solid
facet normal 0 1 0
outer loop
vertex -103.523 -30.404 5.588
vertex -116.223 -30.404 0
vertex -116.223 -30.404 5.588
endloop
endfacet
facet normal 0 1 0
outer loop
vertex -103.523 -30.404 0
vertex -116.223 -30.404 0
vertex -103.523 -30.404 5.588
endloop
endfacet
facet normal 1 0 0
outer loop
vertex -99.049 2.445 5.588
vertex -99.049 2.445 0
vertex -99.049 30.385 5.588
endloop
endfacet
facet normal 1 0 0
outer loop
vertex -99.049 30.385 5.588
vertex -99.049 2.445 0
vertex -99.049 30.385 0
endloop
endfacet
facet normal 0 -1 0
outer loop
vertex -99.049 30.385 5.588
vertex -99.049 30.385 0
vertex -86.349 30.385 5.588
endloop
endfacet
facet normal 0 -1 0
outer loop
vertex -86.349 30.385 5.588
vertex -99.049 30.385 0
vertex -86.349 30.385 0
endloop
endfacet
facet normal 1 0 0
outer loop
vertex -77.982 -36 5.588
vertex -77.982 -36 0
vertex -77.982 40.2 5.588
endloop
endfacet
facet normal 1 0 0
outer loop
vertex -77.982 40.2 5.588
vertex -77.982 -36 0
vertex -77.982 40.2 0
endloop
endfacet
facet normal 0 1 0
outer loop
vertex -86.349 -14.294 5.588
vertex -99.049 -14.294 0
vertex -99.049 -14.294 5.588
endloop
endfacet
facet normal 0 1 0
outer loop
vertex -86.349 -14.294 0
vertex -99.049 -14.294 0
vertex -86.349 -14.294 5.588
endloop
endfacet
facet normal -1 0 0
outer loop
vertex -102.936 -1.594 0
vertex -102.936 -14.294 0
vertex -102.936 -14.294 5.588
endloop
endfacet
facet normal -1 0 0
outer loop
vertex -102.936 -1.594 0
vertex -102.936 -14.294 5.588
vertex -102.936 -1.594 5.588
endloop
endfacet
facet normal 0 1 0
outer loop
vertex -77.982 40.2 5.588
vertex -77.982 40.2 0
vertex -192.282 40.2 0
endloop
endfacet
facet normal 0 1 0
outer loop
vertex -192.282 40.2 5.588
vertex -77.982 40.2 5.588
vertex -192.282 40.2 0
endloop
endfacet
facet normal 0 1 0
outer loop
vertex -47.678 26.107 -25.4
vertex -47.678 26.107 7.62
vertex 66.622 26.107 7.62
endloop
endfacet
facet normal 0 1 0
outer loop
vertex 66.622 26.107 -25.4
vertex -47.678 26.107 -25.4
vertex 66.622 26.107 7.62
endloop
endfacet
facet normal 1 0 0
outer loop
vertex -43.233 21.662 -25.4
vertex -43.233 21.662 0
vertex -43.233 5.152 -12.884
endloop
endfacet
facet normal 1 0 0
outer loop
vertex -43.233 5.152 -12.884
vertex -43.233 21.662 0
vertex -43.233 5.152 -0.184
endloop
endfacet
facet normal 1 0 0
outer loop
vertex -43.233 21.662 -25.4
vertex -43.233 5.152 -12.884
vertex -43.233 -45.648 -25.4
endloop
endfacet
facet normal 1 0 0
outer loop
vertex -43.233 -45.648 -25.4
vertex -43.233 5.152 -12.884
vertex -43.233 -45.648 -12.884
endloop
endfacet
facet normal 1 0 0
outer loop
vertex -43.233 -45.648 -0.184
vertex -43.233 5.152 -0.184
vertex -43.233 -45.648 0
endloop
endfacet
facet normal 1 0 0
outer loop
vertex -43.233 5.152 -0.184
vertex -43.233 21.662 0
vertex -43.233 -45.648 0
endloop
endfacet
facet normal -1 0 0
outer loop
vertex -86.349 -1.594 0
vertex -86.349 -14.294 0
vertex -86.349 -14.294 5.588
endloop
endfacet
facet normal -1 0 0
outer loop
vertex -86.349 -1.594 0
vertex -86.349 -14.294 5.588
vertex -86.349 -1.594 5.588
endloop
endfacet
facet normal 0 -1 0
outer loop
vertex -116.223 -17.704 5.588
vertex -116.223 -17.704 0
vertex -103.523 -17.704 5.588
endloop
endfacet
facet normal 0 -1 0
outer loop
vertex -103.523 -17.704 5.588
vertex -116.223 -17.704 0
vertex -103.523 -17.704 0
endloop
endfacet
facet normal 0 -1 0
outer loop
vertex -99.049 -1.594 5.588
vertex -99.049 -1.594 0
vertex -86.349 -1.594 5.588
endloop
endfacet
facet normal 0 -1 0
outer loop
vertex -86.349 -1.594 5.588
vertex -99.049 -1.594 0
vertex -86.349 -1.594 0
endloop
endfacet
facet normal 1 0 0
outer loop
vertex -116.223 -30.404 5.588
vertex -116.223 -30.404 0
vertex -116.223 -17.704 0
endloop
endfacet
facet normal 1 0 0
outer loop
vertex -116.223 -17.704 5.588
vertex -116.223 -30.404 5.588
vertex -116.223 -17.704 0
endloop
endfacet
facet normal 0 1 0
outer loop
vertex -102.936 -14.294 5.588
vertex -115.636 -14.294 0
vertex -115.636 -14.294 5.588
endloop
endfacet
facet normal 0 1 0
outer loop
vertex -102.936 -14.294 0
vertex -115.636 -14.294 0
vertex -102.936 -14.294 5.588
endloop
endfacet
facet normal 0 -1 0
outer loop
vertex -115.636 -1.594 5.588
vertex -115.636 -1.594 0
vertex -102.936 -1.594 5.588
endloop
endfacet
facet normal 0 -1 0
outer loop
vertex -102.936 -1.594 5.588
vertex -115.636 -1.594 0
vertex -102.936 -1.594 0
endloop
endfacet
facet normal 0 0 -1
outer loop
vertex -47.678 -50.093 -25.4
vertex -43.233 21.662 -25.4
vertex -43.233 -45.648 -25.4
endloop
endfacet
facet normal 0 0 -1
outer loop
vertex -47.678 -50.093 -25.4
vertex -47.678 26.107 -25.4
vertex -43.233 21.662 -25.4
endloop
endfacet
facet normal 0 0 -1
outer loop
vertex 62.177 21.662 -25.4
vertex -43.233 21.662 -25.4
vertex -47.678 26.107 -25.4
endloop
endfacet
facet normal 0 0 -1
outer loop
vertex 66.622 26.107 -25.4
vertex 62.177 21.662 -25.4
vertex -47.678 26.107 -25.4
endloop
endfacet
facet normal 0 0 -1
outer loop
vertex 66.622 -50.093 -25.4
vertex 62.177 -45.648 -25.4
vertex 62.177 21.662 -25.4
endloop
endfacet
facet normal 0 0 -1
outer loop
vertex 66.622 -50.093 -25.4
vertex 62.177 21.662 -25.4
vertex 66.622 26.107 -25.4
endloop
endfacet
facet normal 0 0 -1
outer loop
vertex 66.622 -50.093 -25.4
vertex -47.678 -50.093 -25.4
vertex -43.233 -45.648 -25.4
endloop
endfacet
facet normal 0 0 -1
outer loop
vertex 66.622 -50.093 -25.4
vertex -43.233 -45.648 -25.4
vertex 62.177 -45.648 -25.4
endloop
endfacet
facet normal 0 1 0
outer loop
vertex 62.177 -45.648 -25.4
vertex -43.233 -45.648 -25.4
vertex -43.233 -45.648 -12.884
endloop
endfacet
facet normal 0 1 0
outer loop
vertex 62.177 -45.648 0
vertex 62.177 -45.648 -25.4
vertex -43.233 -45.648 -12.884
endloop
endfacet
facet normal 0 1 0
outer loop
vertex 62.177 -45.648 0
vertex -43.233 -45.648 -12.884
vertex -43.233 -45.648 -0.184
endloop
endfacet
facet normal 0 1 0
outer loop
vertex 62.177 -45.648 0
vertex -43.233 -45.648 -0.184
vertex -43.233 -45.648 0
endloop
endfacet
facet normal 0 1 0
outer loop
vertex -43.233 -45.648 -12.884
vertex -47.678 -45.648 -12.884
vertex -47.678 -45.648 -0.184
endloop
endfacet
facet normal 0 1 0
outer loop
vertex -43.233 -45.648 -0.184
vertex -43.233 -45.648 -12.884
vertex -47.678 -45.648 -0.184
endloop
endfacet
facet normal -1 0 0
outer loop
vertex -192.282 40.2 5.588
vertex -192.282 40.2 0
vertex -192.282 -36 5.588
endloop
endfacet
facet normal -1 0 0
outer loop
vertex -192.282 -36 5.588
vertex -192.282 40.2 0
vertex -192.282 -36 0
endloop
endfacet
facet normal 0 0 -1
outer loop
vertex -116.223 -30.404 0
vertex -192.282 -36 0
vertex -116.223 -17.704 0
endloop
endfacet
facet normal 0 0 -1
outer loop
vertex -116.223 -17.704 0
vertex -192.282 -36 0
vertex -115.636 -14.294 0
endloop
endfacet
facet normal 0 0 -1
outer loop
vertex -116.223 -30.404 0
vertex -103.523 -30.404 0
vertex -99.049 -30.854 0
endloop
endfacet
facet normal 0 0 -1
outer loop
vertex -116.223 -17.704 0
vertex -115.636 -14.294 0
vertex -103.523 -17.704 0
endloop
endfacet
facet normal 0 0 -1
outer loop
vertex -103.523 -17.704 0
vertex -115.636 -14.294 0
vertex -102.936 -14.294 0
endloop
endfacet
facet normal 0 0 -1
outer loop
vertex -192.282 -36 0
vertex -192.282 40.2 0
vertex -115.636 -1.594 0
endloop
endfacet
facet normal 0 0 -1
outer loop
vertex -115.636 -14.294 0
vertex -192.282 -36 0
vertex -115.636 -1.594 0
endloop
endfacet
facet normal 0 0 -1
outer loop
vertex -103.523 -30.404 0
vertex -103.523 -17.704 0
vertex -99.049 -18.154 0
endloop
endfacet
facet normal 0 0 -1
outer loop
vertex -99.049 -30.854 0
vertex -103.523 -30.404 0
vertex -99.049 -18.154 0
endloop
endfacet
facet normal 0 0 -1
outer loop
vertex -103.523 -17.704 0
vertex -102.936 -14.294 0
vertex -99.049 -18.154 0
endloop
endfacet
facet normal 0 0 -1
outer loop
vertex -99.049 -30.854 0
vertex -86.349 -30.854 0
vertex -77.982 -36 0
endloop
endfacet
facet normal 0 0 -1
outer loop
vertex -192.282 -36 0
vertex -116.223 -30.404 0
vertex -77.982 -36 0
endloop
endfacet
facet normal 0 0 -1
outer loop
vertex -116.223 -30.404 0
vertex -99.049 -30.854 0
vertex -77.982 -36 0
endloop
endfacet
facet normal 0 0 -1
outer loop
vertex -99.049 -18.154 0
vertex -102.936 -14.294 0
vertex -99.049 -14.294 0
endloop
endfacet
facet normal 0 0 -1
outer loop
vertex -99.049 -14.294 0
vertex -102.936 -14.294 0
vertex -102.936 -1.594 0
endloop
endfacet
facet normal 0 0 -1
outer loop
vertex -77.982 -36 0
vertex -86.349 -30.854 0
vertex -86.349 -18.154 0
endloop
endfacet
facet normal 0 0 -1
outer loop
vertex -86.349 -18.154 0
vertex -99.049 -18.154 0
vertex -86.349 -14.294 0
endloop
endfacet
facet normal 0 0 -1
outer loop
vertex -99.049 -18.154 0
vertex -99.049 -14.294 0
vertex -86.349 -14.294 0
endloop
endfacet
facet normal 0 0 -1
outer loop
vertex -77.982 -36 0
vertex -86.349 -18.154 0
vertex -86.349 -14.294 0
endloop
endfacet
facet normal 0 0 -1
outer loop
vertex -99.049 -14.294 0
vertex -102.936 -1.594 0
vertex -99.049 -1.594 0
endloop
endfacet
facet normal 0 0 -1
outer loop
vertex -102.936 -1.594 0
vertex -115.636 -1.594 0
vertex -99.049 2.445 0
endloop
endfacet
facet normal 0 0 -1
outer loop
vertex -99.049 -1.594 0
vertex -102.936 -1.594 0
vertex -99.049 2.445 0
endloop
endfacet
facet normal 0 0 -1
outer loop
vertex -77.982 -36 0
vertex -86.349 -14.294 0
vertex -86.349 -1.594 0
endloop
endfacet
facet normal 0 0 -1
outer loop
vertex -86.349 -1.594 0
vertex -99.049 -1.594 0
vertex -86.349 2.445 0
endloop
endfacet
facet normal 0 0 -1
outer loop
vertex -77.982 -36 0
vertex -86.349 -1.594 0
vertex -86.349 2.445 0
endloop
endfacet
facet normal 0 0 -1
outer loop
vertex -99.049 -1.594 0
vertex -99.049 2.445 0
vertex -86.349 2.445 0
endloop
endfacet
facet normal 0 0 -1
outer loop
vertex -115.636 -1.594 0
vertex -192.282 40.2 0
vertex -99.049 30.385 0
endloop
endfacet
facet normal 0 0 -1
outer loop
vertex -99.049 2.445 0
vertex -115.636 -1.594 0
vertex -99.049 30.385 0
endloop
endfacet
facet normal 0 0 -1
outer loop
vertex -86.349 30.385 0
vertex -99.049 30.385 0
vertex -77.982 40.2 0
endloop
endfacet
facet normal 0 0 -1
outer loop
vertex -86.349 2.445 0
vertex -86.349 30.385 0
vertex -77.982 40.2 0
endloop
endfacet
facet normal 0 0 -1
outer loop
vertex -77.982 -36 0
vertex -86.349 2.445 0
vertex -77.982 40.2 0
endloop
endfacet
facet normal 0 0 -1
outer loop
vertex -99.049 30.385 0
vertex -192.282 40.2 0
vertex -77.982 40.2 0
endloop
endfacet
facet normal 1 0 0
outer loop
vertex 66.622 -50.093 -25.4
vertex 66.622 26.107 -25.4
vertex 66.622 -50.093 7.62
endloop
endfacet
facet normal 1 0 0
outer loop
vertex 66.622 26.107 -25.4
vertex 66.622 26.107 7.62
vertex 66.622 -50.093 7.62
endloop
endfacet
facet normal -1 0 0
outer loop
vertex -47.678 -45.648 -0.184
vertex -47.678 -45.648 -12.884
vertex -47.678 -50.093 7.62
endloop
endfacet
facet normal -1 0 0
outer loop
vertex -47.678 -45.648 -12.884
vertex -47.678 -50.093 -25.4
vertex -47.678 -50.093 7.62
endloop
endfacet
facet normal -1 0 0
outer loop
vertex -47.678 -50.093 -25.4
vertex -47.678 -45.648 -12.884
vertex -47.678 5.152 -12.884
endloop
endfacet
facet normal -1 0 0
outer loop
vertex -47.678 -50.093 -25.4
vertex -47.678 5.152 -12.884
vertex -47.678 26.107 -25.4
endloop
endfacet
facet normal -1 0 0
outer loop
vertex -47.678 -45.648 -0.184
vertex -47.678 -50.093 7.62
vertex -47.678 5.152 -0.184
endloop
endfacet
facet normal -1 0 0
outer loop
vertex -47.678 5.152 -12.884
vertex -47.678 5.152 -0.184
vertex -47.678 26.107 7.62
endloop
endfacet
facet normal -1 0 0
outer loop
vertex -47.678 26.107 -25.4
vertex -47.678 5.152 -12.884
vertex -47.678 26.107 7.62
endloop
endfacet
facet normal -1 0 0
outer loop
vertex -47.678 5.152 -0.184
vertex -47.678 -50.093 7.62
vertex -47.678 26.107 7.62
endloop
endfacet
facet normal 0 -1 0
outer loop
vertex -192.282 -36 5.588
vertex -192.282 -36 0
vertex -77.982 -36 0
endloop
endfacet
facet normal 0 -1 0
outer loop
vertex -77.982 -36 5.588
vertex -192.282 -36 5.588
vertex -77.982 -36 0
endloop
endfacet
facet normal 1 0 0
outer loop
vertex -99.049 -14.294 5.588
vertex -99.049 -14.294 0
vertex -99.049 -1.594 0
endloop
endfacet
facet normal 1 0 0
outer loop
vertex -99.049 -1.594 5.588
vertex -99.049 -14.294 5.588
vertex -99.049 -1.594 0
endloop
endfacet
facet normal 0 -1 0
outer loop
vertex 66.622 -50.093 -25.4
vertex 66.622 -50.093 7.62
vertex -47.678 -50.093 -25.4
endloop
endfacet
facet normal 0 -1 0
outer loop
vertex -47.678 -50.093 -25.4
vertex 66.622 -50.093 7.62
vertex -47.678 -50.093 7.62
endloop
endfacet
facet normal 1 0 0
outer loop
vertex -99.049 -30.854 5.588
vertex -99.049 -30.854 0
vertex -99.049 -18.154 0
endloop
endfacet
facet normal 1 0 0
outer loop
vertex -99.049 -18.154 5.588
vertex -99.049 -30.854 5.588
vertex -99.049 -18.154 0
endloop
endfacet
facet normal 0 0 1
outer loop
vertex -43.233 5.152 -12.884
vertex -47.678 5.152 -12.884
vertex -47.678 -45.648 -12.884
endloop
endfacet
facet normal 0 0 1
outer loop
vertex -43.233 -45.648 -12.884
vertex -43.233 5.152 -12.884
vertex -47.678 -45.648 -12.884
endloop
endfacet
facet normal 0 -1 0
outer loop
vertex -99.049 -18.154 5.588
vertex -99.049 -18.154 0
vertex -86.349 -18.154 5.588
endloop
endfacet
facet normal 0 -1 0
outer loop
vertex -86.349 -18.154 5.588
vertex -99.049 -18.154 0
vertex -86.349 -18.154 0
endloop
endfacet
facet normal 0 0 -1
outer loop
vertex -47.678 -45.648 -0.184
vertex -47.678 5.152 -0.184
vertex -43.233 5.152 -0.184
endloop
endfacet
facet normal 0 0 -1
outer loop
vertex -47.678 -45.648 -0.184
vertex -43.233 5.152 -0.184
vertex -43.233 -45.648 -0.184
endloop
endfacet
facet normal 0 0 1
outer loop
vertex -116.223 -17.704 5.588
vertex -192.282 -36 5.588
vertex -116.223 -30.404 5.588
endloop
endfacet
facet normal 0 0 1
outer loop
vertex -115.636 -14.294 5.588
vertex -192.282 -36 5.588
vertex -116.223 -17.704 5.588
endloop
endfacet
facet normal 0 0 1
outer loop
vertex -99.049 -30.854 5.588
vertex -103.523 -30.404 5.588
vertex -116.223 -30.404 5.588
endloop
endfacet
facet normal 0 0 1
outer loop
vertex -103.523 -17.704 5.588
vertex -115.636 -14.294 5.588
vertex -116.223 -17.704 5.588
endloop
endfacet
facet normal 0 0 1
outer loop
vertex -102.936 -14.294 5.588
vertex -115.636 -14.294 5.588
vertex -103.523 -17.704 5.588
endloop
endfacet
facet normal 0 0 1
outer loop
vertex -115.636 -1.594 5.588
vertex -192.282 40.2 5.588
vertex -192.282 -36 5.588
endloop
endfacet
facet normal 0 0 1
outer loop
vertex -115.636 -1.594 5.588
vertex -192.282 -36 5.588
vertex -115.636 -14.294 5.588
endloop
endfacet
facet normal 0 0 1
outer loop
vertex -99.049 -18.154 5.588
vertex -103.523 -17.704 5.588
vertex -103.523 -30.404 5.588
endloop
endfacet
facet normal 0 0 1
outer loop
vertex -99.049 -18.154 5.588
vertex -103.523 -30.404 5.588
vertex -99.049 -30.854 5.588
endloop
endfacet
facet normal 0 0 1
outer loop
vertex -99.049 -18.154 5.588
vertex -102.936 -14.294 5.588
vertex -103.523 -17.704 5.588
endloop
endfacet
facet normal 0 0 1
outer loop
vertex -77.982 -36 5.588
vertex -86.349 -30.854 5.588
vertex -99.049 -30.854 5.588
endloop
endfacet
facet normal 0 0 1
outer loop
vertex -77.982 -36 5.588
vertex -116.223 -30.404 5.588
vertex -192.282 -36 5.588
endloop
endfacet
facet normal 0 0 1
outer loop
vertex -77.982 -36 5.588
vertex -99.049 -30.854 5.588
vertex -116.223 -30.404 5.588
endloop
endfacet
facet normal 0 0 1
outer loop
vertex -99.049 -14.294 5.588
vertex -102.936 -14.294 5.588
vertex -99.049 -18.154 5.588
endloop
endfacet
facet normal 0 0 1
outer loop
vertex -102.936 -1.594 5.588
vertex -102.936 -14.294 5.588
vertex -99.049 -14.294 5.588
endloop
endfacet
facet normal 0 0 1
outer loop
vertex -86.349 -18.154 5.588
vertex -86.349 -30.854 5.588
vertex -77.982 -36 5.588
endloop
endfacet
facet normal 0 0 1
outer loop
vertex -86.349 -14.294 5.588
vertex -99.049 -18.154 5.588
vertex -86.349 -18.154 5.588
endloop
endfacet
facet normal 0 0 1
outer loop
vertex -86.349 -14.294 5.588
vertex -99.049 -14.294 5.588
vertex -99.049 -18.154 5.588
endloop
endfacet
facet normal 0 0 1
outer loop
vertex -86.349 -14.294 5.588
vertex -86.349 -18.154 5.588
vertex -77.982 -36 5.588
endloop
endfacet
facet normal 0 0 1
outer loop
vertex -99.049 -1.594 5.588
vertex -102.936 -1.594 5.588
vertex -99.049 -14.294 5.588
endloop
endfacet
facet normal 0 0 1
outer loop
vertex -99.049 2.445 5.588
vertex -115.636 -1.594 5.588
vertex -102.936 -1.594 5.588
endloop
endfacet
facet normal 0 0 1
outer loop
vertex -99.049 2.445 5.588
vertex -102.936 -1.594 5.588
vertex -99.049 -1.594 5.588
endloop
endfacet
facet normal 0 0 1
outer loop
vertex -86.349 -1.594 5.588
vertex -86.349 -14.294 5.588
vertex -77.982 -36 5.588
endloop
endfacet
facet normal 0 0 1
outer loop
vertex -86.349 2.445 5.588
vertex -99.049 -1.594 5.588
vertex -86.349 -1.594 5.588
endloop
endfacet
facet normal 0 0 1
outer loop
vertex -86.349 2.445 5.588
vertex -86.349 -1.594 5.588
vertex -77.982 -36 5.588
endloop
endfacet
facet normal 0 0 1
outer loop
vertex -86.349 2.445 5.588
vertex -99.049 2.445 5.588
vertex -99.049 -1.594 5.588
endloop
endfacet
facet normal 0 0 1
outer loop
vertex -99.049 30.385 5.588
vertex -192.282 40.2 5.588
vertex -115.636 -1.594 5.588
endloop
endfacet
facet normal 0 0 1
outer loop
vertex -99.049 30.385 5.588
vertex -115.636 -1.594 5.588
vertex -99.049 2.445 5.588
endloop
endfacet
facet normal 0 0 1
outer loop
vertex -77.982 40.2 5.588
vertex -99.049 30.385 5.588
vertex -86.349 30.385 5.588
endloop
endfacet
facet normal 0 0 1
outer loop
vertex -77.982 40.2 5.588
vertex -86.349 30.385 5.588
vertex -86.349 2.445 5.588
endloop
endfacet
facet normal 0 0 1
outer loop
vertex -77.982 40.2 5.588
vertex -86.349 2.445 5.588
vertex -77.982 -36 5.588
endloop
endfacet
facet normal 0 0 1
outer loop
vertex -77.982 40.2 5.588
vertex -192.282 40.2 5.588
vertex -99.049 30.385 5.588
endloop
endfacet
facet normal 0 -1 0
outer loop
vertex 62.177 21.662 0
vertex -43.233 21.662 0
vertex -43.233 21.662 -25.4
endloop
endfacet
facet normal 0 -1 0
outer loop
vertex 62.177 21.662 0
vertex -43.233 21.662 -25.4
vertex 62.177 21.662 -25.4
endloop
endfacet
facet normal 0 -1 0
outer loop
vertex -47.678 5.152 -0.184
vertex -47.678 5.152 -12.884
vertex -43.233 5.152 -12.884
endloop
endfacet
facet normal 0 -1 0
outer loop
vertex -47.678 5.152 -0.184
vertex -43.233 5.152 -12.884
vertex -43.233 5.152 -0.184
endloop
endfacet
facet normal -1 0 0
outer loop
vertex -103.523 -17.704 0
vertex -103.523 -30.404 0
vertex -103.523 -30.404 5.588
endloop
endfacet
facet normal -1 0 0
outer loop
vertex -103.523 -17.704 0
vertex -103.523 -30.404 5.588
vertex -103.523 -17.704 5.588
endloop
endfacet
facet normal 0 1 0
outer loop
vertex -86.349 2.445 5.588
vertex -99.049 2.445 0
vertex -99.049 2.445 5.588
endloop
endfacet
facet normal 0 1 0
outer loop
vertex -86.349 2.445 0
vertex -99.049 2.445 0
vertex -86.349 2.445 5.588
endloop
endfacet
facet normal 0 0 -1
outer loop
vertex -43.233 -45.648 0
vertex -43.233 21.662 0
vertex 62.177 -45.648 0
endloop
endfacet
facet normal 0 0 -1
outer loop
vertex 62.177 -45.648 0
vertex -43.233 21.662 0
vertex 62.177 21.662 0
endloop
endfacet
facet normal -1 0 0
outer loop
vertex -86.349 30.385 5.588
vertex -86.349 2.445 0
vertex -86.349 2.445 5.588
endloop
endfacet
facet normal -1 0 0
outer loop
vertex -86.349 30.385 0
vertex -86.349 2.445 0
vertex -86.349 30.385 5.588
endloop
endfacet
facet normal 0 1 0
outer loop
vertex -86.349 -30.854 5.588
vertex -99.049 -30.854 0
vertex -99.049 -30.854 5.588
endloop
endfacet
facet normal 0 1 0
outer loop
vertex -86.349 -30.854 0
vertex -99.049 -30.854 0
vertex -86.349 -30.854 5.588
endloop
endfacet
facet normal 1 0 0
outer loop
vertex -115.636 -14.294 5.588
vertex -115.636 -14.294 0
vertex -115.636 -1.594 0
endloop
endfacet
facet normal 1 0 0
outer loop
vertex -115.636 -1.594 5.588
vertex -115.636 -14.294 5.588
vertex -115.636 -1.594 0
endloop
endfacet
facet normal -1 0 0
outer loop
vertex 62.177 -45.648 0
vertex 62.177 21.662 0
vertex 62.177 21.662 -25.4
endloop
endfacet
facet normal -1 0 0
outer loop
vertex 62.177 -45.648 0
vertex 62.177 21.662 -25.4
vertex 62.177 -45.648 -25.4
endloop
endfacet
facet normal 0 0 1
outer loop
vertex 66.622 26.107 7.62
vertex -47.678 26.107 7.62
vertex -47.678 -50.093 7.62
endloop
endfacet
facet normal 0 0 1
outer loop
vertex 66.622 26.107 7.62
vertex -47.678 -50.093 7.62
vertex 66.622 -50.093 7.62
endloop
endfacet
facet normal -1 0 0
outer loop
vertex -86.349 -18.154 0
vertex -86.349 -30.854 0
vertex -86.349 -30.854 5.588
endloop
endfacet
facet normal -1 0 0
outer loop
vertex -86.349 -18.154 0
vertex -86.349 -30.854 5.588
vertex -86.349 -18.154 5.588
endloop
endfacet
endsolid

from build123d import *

# Parameters (mm, degrees)
F0_W     = 114.3
F0_H     = 76.2
F1_DEPTH = 7.62
F2_W     = 105.41
F2_H     = 67.31
F3_DEPTH = 25.4
F4_W     = 50.8
F4_H     = 12.7
F5_DEPTH = 4.445
F6_W     = 12.7
F6_H     = 12.7
F6_H_2   = 27.94
F7_DEPTH = 5.588


with BuildPart() as f1:
    # F0 (on Top) → F1 (new body)
    with BuildSketch(Plane.XY):
        with Locations((9.471919, -11.993243)):
            Rectangle(F0_W, F0_H)
    extrude(amount=F1_DEPTH)

    # F2 (on face) → F3 (join)
    with BuildSketch(Plane(origin=(0, 0, 0), x_dir=(1, 0, 0), z_dir=(0, 0, -1))):
        Polygon((-47.678081, -23.566757), (-47.678081, -26.106757), (25.981919, -26.106757), (66.621919, -26.106757), (66.621919, 45.648243), (66.621919, 50.093243), (-43.233081, 50.093243), (-47.678081, 50.093243), align=None)
        with Locations((9.471919, 11.993243)):
            Rectangle(F2_W, F2_H, mode=Mode.SUBTRACT)
    extrude(amount=F3_DEPTH)

    # F4 (on face) → F5 (cut)
    with BuildSketch(Plane(origin=(-47.678081, 0, 0), x_dir=(0, -1, 0), z_dir=(-1, 0, 0))):
        with Locations((20.248243, -6.533841)):
            Rectangle(F4_W, F4_H)
    extrude(amount=-F5_DEPTH, mode=Mode.SUBTRACT)


with BuildPart() as f7:
    # F6 (on Top) → F7 (new body)
    with BuildSketch(Plane.XY):
        Polygon((-77.982212, 40.199725), (-192.282212, 40.199725), (-192.282212, -36.000275), (-77.982212, -36.000275), (-77.982212, -30.854341), align=None)
        with Locations((-109.87301, -24.05386)):
            Rectangle(F6_W, F6_H, mode=Mode.SUBTRACT)
        with Locations((-92.699263, -24.504341)):
            Rectangle(F6_W, F6_H, mode=Mode.SUBTRACT)
        with Locations((-109.286393, -7.943684)):
            Rectangle(F6_W, F6_H, mode=Mode.SUBTRACT)
        with Locations((-92.699263, -7.943684)):
            Rectangle(F6_W, F6_H, mode=Mode.SUBTRACT)
        with Locations((-92.699263, 16.414591)):
            Rectangle(F6_W, F6_H_2, mode=Mode.SUBTRACT)
    extrude(amount=F7_DEPTH)


solid = Compound([f1.part, f7.part])
